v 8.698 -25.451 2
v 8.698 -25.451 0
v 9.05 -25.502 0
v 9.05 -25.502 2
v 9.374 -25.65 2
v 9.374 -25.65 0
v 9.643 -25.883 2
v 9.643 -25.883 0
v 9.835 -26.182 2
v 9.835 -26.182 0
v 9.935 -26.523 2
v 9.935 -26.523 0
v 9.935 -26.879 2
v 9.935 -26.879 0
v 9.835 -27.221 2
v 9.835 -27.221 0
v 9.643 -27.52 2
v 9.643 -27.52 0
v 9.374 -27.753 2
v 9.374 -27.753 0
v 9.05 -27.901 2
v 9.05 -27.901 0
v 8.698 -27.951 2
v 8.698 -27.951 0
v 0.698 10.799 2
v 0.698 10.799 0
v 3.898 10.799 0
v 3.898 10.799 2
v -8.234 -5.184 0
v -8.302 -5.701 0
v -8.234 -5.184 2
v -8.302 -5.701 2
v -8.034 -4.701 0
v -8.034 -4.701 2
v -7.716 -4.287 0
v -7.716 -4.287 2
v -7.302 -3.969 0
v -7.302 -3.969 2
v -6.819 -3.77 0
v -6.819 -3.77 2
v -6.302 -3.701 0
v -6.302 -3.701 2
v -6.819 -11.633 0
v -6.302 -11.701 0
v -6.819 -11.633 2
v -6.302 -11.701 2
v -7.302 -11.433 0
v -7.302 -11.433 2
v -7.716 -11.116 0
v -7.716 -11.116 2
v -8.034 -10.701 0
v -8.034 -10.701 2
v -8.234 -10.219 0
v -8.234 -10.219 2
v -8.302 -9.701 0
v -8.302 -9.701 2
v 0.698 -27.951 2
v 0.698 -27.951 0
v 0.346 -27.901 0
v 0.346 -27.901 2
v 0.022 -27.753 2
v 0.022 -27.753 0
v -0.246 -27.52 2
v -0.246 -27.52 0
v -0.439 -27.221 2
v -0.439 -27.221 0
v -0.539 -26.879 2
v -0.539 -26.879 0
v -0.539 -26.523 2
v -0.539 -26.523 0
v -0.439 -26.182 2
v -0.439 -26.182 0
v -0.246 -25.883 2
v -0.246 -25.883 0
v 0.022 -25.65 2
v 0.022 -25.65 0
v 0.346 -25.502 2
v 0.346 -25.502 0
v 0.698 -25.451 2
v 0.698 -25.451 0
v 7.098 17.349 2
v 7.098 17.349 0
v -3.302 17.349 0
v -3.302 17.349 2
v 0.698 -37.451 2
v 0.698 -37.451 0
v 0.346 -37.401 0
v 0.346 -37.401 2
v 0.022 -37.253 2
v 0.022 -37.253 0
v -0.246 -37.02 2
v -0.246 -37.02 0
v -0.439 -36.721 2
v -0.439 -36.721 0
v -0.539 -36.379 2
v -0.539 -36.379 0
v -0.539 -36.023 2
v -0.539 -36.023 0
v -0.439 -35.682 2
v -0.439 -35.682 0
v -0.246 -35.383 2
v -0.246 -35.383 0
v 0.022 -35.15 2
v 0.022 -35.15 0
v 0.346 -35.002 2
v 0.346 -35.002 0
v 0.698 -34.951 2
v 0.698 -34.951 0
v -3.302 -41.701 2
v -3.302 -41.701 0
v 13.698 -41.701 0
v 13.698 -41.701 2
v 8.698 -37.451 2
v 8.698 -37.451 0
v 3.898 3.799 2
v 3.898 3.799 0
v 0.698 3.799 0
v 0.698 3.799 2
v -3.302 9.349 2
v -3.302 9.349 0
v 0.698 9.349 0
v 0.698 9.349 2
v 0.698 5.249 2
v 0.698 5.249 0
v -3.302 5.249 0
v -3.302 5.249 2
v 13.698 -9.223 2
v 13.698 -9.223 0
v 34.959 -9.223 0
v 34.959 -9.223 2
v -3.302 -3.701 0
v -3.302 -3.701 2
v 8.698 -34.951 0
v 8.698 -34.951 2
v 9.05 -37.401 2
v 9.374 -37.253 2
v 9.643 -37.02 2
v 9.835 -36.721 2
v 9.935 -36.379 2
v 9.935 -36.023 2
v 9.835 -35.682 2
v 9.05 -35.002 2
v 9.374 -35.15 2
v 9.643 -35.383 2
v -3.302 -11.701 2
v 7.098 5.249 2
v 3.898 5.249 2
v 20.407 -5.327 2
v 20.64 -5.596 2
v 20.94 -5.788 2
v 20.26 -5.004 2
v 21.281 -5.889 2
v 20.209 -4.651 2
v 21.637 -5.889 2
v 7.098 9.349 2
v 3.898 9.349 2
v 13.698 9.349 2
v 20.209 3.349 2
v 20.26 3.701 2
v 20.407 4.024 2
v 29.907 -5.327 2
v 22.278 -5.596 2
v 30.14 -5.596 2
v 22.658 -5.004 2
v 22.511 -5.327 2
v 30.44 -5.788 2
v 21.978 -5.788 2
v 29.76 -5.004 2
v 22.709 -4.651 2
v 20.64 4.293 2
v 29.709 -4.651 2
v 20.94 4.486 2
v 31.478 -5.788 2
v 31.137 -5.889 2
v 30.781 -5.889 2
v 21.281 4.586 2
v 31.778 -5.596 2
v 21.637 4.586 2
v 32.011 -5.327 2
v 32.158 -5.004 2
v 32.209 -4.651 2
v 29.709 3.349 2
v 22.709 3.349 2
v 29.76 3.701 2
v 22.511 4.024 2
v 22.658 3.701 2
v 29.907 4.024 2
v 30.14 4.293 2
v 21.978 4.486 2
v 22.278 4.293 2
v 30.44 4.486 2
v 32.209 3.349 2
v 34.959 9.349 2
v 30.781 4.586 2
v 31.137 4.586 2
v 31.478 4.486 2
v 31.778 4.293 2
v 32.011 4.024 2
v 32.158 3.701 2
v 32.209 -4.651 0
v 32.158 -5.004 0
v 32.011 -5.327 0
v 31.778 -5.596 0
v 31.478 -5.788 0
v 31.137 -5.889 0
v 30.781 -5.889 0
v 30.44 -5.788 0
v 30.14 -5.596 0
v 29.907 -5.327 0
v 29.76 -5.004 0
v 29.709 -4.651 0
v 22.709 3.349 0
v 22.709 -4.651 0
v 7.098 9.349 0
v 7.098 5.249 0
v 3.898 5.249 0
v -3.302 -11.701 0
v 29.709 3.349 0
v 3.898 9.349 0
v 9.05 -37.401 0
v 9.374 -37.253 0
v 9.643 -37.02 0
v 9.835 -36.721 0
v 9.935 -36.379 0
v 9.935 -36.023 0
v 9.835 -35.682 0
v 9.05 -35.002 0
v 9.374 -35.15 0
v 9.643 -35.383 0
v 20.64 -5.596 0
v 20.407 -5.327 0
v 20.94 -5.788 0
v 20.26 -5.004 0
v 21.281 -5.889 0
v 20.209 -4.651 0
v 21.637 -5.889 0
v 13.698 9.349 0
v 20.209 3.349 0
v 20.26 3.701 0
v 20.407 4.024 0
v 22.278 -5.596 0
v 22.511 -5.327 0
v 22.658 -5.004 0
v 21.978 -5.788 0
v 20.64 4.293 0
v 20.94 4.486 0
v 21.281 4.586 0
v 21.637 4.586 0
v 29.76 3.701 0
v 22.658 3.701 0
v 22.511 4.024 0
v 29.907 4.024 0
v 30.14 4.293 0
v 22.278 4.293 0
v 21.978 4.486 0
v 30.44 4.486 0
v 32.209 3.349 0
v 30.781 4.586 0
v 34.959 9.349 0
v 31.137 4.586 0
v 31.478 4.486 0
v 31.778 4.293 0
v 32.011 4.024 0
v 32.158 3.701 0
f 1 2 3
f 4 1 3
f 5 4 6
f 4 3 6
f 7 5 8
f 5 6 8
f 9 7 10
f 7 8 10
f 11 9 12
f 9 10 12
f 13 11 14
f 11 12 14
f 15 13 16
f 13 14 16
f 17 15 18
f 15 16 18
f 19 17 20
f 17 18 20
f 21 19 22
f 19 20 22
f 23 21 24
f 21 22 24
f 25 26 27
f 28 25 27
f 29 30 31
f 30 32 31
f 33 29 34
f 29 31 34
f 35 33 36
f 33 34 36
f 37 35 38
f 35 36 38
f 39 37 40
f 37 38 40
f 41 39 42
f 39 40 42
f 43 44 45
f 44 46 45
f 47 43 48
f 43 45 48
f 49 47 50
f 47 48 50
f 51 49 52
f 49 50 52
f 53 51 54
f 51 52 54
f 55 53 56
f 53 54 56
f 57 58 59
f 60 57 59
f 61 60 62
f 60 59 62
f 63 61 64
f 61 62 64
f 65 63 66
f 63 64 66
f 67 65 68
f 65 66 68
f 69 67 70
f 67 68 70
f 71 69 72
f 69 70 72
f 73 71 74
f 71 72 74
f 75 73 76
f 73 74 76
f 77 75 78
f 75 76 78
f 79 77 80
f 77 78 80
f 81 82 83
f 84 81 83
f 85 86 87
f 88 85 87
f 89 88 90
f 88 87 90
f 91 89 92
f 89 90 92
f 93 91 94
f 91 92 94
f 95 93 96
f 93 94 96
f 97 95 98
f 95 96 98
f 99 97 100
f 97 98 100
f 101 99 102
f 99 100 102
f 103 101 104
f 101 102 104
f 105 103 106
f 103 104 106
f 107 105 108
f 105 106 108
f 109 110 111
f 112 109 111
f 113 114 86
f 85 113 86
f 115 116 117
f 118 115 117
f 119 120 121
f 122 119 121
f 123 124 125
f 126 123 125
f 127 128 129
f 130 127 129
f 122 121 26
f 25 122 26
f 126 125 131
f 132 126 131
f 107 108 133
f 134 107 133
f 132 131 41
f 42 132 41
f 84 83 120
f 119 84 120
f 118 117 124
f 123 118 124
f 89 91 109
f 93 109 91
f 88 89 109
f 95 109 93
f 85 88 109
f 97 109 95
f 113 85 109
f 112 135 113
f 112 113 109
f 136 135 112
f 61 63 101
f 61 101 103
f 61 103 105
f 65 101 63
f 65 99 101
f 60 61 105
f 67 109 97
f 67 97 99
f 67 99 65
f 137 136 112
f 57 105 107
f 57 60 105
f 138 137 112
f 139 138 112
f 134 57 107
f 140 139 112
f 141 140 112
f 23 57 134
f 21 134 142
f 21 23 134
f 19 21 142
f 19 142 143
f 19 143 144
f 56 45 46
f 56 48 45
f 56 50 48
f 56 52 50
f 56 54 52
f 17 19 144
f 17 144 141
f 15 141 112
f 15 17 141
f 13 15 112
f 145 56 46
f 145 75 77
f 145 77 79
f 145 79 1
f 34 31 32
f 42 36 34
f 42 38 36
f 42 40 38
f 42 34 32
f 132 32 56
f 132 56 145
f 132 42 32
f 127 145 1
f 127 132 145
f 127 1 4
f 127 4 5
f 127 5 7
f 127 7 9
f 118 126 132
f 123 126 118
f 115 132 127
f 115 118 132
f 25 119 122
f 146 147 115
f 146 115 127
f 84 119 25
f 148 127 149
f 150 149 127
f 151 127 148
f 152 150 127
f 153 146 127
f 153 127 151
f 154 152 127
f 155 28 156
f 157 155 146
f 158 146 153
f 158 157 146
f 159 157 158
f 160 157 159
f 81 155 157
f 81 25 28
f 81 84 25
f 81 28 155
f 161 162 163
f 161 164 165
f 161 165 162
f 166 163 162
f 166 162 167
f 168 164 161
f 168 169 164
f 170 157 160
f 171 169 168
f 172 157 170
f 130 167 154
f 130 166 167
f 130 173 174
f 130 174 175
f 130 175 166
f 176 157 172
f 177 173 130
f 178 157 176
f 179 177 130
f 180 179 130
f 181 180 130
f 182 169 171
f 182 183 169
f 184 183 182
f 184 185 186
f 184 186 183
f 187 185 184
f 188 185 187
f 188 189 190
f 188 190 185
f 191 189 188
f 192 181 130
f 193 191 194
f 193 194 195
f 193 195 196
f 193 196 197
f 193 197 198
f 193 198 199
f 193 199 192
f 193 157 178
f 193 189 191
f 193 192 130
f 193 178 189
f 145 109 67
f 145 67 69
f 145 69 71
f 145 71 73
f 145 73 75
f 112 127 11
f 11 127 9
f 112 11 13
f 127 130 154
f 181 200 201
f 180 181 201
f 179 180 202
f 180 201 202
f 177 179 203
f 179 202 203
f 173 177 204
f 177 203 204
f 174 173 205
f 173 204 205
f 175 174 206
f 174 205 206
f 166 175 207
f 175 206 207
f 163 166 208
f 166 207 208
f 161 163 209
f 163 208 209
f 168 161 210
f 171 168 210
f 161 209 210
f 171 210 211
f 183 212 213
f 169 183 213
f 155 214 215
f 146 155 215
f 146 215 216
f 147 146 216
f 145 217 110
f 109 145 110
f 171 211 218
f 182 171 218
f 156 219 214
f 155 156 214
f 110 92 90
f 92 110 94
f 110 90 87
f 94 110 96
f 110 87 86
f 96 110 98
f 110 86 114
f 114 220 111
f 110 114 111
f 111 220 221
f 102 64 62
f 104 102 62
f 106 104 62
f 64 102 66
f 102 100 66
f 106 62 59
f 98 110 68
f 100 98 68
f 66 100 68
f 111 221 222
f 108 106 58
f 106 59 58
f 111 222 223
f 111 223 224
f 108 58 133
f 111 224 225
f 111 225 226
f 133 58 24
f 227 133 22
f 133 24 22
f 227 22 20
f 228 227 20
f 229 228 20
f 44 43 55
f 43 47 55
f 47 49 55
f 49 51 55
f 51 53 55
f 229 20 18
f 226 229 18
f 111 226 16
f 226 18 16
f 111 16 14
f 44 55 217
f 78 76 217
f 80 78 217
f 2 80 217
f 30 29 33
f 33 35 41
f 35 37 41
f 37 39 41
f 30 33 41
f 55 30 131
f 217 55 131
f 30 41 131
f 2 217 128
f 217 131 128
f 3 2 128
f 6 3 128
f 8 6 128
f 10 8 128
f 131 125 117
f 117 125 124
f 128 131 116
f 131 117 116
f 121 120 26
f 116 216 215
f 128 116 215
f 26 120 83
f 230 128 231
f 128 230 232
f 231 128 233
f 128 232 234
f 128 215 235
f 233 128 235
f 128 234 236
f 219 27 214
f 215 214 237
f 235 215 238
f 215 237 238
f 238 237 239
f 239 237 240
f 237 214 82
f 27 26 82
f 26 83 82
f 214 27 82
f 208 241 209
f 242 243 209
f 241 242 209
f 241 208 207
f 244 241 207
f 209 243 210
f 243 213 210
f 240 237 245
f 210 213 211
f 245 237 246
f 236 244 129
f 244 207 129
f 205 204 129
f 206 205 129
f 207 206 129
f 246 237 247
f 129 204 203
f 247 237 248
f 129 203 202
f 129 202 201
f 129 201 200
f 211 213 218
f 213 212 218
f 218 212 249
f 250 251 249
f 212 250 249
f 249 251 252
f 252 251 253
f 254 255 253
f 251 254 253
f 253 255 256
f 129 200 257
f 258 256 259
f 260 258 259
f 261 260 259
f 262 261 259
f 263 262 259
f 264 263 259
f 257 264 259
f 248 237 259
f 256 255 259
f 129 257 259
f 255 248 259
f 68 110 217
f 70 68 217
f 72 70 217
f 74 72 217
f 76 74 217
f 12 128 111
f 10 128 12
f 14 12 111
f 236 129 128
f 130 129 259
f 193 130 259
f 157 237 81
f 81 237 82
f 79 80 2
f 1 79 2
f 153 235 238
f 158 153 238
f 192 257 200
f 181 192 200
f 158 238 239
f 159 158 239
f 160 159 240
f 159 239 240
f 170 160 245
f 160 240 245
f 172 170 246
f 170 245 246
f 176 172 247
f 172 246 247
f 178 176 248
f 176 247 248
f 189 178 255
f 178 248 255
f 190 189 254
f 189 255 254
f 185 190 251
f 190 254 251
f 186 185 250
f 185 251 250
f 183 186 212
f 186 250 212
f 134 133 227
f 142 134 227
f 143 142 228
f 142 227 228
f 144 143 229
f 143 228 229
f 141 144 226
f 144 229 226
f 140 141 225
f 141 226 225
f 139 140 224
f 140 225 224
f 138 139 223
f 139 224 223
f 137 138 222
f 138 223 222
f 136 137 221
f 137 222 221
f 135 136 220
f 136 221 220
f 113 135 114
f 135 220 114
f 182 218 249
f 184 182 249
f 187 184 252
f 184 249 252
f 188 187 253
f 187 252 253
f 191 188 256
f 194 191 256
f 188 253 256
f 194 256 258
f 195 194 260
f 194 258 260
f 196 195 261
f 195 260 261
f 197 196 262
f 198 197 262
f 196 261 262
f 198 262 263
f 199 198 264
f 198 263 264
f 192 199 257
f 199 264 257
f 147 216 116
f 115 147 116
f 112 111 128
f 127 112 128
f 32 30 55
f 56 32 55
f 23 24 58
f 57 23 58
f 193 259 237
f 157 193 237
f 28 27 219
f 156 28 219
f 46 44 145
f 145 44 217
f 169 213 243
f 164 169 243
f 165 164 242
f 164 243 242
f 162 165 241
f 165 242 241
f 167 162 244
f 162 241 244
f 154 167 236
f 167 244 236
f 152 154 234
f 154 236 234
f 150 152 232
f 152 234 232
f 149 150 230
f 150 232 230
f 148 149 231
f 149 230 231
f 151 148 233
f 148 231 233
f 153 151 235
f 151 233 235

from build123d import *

# Parameters (mm, degrees)
EXTRUDE_1_DEPTH = 2
FILLET_1_R      = 2


with BuildPart() as part:
    # 草图1 → 凸台-拉伸1 (new body)
    with BuildSketch(Plane.XY):
        Polygon((-8.301811847, -11.701358885), (-3.301811847, -11.701358885), (-3.301811847, -41.701358885), (13.698188153, -41.701358885), (13.698188153, -9.223166137), (34.95900929, -9.223166137), (34.95900929, 9.348641115), (13.698188153, 9.348641115), (7.098188153, 17.348641115), (-3.301811847, 17.348641115), (-3.301811847, 9.348641115), (0.698188153, 9.348641115), (0.698188153, 10.798641115), (3.898188153, 10.798641115), (3.898188153, 9.348641115), (7.098188153, 9.348641115), (7.098188153, 5.248641115), (3.898188153, 5.248641115), (3.898188153, 3.798641115), (0.698188153, 3.798641115), (0.698188153, 5.248641115), (-3.301811847, 5.248641115), (-3.301811847, -3.701358885), (-8.301811847, -3.701358885), align=None)
        with BuildLine():
            Line((0.698188153, -25.451358885), (8.698188153, -25.451358885))
            ThreePointArc((8.698188153, -25.451358885), (9.948188153, -26.701358885), (8.698188153, -27.951358885))
            Line((8.698188153, -27.951358885), (0.698188153, -27.951358885))
            ThreePointArc((0.698188153, -27.951358885), (-0.551811847, -26.701358885), (0.698188153, -25.451358885))
        make_face(mode=Mode.SUBTRACT)
        with BuildLine():
            Line((8.698188153, -37.451358885), (0.698188153, -37.451358885))
            ThreePointArc((0.698188153, -37.451358885), (-0.551811847, -36.201358885), (0.698188153, -34.951358885))
            Line((0.698188153, -34.951358885), (8.698188153, -34.951358885))
            ThreePointArc((8.698188153, -34.951358885), (9.948188153, -36.201358885), (8.698188153, -37.451358885))
        make_face(mode=Mode.SUBTRACT)
        with BuildLine():
            Line((32.20900929, 3.348641115), (32.20900929, -4.651358885))
            ThreePointArc((32.20900929, -4.651358885), (30.95900929, -5.901358885), (29.70900929, -4.651358885))
            Line((29.70900929, -4.651358885), (29.70900929, 3.348641115))
            ThreePointArc((29.70900929, 3.348641115), (30.95900929, 4.598641115), (32.20900929, 3.348641115))
        make_face(mode=Mode.SUBTRACT)
        with BuildLine():
            Line((22.70900929, 3.348641115), (22.70900929, -4.651358885))
            ThreePointArc((22.70900929, -4.651358885), (21.45900929, -5.901358885), (20.20900929, -4.651358885))
            Line((20.20900929, -4.651358885), (20.20900929, 3.348641115))
            ThreePointArc((20.20900929, 3.348641115), (21.45900929, 4.598641115), (22.70900929, 3.348641115))
        make_face(mode=Mode.SUBTRACT)
    extrude(amount=EXTRUDE_1_DEPTH)

    # 圆角1
    fillet_1_edges = [part.edges().sort_by_distance(p)[0] for p in [
        (-8.301811847, -3.701358885, 1),
        (-8.301811847, -11.701358885, 1),
    ]]
    fillet(fillet_1_edges, radius=FILLET_1_R)


solid = part.part
